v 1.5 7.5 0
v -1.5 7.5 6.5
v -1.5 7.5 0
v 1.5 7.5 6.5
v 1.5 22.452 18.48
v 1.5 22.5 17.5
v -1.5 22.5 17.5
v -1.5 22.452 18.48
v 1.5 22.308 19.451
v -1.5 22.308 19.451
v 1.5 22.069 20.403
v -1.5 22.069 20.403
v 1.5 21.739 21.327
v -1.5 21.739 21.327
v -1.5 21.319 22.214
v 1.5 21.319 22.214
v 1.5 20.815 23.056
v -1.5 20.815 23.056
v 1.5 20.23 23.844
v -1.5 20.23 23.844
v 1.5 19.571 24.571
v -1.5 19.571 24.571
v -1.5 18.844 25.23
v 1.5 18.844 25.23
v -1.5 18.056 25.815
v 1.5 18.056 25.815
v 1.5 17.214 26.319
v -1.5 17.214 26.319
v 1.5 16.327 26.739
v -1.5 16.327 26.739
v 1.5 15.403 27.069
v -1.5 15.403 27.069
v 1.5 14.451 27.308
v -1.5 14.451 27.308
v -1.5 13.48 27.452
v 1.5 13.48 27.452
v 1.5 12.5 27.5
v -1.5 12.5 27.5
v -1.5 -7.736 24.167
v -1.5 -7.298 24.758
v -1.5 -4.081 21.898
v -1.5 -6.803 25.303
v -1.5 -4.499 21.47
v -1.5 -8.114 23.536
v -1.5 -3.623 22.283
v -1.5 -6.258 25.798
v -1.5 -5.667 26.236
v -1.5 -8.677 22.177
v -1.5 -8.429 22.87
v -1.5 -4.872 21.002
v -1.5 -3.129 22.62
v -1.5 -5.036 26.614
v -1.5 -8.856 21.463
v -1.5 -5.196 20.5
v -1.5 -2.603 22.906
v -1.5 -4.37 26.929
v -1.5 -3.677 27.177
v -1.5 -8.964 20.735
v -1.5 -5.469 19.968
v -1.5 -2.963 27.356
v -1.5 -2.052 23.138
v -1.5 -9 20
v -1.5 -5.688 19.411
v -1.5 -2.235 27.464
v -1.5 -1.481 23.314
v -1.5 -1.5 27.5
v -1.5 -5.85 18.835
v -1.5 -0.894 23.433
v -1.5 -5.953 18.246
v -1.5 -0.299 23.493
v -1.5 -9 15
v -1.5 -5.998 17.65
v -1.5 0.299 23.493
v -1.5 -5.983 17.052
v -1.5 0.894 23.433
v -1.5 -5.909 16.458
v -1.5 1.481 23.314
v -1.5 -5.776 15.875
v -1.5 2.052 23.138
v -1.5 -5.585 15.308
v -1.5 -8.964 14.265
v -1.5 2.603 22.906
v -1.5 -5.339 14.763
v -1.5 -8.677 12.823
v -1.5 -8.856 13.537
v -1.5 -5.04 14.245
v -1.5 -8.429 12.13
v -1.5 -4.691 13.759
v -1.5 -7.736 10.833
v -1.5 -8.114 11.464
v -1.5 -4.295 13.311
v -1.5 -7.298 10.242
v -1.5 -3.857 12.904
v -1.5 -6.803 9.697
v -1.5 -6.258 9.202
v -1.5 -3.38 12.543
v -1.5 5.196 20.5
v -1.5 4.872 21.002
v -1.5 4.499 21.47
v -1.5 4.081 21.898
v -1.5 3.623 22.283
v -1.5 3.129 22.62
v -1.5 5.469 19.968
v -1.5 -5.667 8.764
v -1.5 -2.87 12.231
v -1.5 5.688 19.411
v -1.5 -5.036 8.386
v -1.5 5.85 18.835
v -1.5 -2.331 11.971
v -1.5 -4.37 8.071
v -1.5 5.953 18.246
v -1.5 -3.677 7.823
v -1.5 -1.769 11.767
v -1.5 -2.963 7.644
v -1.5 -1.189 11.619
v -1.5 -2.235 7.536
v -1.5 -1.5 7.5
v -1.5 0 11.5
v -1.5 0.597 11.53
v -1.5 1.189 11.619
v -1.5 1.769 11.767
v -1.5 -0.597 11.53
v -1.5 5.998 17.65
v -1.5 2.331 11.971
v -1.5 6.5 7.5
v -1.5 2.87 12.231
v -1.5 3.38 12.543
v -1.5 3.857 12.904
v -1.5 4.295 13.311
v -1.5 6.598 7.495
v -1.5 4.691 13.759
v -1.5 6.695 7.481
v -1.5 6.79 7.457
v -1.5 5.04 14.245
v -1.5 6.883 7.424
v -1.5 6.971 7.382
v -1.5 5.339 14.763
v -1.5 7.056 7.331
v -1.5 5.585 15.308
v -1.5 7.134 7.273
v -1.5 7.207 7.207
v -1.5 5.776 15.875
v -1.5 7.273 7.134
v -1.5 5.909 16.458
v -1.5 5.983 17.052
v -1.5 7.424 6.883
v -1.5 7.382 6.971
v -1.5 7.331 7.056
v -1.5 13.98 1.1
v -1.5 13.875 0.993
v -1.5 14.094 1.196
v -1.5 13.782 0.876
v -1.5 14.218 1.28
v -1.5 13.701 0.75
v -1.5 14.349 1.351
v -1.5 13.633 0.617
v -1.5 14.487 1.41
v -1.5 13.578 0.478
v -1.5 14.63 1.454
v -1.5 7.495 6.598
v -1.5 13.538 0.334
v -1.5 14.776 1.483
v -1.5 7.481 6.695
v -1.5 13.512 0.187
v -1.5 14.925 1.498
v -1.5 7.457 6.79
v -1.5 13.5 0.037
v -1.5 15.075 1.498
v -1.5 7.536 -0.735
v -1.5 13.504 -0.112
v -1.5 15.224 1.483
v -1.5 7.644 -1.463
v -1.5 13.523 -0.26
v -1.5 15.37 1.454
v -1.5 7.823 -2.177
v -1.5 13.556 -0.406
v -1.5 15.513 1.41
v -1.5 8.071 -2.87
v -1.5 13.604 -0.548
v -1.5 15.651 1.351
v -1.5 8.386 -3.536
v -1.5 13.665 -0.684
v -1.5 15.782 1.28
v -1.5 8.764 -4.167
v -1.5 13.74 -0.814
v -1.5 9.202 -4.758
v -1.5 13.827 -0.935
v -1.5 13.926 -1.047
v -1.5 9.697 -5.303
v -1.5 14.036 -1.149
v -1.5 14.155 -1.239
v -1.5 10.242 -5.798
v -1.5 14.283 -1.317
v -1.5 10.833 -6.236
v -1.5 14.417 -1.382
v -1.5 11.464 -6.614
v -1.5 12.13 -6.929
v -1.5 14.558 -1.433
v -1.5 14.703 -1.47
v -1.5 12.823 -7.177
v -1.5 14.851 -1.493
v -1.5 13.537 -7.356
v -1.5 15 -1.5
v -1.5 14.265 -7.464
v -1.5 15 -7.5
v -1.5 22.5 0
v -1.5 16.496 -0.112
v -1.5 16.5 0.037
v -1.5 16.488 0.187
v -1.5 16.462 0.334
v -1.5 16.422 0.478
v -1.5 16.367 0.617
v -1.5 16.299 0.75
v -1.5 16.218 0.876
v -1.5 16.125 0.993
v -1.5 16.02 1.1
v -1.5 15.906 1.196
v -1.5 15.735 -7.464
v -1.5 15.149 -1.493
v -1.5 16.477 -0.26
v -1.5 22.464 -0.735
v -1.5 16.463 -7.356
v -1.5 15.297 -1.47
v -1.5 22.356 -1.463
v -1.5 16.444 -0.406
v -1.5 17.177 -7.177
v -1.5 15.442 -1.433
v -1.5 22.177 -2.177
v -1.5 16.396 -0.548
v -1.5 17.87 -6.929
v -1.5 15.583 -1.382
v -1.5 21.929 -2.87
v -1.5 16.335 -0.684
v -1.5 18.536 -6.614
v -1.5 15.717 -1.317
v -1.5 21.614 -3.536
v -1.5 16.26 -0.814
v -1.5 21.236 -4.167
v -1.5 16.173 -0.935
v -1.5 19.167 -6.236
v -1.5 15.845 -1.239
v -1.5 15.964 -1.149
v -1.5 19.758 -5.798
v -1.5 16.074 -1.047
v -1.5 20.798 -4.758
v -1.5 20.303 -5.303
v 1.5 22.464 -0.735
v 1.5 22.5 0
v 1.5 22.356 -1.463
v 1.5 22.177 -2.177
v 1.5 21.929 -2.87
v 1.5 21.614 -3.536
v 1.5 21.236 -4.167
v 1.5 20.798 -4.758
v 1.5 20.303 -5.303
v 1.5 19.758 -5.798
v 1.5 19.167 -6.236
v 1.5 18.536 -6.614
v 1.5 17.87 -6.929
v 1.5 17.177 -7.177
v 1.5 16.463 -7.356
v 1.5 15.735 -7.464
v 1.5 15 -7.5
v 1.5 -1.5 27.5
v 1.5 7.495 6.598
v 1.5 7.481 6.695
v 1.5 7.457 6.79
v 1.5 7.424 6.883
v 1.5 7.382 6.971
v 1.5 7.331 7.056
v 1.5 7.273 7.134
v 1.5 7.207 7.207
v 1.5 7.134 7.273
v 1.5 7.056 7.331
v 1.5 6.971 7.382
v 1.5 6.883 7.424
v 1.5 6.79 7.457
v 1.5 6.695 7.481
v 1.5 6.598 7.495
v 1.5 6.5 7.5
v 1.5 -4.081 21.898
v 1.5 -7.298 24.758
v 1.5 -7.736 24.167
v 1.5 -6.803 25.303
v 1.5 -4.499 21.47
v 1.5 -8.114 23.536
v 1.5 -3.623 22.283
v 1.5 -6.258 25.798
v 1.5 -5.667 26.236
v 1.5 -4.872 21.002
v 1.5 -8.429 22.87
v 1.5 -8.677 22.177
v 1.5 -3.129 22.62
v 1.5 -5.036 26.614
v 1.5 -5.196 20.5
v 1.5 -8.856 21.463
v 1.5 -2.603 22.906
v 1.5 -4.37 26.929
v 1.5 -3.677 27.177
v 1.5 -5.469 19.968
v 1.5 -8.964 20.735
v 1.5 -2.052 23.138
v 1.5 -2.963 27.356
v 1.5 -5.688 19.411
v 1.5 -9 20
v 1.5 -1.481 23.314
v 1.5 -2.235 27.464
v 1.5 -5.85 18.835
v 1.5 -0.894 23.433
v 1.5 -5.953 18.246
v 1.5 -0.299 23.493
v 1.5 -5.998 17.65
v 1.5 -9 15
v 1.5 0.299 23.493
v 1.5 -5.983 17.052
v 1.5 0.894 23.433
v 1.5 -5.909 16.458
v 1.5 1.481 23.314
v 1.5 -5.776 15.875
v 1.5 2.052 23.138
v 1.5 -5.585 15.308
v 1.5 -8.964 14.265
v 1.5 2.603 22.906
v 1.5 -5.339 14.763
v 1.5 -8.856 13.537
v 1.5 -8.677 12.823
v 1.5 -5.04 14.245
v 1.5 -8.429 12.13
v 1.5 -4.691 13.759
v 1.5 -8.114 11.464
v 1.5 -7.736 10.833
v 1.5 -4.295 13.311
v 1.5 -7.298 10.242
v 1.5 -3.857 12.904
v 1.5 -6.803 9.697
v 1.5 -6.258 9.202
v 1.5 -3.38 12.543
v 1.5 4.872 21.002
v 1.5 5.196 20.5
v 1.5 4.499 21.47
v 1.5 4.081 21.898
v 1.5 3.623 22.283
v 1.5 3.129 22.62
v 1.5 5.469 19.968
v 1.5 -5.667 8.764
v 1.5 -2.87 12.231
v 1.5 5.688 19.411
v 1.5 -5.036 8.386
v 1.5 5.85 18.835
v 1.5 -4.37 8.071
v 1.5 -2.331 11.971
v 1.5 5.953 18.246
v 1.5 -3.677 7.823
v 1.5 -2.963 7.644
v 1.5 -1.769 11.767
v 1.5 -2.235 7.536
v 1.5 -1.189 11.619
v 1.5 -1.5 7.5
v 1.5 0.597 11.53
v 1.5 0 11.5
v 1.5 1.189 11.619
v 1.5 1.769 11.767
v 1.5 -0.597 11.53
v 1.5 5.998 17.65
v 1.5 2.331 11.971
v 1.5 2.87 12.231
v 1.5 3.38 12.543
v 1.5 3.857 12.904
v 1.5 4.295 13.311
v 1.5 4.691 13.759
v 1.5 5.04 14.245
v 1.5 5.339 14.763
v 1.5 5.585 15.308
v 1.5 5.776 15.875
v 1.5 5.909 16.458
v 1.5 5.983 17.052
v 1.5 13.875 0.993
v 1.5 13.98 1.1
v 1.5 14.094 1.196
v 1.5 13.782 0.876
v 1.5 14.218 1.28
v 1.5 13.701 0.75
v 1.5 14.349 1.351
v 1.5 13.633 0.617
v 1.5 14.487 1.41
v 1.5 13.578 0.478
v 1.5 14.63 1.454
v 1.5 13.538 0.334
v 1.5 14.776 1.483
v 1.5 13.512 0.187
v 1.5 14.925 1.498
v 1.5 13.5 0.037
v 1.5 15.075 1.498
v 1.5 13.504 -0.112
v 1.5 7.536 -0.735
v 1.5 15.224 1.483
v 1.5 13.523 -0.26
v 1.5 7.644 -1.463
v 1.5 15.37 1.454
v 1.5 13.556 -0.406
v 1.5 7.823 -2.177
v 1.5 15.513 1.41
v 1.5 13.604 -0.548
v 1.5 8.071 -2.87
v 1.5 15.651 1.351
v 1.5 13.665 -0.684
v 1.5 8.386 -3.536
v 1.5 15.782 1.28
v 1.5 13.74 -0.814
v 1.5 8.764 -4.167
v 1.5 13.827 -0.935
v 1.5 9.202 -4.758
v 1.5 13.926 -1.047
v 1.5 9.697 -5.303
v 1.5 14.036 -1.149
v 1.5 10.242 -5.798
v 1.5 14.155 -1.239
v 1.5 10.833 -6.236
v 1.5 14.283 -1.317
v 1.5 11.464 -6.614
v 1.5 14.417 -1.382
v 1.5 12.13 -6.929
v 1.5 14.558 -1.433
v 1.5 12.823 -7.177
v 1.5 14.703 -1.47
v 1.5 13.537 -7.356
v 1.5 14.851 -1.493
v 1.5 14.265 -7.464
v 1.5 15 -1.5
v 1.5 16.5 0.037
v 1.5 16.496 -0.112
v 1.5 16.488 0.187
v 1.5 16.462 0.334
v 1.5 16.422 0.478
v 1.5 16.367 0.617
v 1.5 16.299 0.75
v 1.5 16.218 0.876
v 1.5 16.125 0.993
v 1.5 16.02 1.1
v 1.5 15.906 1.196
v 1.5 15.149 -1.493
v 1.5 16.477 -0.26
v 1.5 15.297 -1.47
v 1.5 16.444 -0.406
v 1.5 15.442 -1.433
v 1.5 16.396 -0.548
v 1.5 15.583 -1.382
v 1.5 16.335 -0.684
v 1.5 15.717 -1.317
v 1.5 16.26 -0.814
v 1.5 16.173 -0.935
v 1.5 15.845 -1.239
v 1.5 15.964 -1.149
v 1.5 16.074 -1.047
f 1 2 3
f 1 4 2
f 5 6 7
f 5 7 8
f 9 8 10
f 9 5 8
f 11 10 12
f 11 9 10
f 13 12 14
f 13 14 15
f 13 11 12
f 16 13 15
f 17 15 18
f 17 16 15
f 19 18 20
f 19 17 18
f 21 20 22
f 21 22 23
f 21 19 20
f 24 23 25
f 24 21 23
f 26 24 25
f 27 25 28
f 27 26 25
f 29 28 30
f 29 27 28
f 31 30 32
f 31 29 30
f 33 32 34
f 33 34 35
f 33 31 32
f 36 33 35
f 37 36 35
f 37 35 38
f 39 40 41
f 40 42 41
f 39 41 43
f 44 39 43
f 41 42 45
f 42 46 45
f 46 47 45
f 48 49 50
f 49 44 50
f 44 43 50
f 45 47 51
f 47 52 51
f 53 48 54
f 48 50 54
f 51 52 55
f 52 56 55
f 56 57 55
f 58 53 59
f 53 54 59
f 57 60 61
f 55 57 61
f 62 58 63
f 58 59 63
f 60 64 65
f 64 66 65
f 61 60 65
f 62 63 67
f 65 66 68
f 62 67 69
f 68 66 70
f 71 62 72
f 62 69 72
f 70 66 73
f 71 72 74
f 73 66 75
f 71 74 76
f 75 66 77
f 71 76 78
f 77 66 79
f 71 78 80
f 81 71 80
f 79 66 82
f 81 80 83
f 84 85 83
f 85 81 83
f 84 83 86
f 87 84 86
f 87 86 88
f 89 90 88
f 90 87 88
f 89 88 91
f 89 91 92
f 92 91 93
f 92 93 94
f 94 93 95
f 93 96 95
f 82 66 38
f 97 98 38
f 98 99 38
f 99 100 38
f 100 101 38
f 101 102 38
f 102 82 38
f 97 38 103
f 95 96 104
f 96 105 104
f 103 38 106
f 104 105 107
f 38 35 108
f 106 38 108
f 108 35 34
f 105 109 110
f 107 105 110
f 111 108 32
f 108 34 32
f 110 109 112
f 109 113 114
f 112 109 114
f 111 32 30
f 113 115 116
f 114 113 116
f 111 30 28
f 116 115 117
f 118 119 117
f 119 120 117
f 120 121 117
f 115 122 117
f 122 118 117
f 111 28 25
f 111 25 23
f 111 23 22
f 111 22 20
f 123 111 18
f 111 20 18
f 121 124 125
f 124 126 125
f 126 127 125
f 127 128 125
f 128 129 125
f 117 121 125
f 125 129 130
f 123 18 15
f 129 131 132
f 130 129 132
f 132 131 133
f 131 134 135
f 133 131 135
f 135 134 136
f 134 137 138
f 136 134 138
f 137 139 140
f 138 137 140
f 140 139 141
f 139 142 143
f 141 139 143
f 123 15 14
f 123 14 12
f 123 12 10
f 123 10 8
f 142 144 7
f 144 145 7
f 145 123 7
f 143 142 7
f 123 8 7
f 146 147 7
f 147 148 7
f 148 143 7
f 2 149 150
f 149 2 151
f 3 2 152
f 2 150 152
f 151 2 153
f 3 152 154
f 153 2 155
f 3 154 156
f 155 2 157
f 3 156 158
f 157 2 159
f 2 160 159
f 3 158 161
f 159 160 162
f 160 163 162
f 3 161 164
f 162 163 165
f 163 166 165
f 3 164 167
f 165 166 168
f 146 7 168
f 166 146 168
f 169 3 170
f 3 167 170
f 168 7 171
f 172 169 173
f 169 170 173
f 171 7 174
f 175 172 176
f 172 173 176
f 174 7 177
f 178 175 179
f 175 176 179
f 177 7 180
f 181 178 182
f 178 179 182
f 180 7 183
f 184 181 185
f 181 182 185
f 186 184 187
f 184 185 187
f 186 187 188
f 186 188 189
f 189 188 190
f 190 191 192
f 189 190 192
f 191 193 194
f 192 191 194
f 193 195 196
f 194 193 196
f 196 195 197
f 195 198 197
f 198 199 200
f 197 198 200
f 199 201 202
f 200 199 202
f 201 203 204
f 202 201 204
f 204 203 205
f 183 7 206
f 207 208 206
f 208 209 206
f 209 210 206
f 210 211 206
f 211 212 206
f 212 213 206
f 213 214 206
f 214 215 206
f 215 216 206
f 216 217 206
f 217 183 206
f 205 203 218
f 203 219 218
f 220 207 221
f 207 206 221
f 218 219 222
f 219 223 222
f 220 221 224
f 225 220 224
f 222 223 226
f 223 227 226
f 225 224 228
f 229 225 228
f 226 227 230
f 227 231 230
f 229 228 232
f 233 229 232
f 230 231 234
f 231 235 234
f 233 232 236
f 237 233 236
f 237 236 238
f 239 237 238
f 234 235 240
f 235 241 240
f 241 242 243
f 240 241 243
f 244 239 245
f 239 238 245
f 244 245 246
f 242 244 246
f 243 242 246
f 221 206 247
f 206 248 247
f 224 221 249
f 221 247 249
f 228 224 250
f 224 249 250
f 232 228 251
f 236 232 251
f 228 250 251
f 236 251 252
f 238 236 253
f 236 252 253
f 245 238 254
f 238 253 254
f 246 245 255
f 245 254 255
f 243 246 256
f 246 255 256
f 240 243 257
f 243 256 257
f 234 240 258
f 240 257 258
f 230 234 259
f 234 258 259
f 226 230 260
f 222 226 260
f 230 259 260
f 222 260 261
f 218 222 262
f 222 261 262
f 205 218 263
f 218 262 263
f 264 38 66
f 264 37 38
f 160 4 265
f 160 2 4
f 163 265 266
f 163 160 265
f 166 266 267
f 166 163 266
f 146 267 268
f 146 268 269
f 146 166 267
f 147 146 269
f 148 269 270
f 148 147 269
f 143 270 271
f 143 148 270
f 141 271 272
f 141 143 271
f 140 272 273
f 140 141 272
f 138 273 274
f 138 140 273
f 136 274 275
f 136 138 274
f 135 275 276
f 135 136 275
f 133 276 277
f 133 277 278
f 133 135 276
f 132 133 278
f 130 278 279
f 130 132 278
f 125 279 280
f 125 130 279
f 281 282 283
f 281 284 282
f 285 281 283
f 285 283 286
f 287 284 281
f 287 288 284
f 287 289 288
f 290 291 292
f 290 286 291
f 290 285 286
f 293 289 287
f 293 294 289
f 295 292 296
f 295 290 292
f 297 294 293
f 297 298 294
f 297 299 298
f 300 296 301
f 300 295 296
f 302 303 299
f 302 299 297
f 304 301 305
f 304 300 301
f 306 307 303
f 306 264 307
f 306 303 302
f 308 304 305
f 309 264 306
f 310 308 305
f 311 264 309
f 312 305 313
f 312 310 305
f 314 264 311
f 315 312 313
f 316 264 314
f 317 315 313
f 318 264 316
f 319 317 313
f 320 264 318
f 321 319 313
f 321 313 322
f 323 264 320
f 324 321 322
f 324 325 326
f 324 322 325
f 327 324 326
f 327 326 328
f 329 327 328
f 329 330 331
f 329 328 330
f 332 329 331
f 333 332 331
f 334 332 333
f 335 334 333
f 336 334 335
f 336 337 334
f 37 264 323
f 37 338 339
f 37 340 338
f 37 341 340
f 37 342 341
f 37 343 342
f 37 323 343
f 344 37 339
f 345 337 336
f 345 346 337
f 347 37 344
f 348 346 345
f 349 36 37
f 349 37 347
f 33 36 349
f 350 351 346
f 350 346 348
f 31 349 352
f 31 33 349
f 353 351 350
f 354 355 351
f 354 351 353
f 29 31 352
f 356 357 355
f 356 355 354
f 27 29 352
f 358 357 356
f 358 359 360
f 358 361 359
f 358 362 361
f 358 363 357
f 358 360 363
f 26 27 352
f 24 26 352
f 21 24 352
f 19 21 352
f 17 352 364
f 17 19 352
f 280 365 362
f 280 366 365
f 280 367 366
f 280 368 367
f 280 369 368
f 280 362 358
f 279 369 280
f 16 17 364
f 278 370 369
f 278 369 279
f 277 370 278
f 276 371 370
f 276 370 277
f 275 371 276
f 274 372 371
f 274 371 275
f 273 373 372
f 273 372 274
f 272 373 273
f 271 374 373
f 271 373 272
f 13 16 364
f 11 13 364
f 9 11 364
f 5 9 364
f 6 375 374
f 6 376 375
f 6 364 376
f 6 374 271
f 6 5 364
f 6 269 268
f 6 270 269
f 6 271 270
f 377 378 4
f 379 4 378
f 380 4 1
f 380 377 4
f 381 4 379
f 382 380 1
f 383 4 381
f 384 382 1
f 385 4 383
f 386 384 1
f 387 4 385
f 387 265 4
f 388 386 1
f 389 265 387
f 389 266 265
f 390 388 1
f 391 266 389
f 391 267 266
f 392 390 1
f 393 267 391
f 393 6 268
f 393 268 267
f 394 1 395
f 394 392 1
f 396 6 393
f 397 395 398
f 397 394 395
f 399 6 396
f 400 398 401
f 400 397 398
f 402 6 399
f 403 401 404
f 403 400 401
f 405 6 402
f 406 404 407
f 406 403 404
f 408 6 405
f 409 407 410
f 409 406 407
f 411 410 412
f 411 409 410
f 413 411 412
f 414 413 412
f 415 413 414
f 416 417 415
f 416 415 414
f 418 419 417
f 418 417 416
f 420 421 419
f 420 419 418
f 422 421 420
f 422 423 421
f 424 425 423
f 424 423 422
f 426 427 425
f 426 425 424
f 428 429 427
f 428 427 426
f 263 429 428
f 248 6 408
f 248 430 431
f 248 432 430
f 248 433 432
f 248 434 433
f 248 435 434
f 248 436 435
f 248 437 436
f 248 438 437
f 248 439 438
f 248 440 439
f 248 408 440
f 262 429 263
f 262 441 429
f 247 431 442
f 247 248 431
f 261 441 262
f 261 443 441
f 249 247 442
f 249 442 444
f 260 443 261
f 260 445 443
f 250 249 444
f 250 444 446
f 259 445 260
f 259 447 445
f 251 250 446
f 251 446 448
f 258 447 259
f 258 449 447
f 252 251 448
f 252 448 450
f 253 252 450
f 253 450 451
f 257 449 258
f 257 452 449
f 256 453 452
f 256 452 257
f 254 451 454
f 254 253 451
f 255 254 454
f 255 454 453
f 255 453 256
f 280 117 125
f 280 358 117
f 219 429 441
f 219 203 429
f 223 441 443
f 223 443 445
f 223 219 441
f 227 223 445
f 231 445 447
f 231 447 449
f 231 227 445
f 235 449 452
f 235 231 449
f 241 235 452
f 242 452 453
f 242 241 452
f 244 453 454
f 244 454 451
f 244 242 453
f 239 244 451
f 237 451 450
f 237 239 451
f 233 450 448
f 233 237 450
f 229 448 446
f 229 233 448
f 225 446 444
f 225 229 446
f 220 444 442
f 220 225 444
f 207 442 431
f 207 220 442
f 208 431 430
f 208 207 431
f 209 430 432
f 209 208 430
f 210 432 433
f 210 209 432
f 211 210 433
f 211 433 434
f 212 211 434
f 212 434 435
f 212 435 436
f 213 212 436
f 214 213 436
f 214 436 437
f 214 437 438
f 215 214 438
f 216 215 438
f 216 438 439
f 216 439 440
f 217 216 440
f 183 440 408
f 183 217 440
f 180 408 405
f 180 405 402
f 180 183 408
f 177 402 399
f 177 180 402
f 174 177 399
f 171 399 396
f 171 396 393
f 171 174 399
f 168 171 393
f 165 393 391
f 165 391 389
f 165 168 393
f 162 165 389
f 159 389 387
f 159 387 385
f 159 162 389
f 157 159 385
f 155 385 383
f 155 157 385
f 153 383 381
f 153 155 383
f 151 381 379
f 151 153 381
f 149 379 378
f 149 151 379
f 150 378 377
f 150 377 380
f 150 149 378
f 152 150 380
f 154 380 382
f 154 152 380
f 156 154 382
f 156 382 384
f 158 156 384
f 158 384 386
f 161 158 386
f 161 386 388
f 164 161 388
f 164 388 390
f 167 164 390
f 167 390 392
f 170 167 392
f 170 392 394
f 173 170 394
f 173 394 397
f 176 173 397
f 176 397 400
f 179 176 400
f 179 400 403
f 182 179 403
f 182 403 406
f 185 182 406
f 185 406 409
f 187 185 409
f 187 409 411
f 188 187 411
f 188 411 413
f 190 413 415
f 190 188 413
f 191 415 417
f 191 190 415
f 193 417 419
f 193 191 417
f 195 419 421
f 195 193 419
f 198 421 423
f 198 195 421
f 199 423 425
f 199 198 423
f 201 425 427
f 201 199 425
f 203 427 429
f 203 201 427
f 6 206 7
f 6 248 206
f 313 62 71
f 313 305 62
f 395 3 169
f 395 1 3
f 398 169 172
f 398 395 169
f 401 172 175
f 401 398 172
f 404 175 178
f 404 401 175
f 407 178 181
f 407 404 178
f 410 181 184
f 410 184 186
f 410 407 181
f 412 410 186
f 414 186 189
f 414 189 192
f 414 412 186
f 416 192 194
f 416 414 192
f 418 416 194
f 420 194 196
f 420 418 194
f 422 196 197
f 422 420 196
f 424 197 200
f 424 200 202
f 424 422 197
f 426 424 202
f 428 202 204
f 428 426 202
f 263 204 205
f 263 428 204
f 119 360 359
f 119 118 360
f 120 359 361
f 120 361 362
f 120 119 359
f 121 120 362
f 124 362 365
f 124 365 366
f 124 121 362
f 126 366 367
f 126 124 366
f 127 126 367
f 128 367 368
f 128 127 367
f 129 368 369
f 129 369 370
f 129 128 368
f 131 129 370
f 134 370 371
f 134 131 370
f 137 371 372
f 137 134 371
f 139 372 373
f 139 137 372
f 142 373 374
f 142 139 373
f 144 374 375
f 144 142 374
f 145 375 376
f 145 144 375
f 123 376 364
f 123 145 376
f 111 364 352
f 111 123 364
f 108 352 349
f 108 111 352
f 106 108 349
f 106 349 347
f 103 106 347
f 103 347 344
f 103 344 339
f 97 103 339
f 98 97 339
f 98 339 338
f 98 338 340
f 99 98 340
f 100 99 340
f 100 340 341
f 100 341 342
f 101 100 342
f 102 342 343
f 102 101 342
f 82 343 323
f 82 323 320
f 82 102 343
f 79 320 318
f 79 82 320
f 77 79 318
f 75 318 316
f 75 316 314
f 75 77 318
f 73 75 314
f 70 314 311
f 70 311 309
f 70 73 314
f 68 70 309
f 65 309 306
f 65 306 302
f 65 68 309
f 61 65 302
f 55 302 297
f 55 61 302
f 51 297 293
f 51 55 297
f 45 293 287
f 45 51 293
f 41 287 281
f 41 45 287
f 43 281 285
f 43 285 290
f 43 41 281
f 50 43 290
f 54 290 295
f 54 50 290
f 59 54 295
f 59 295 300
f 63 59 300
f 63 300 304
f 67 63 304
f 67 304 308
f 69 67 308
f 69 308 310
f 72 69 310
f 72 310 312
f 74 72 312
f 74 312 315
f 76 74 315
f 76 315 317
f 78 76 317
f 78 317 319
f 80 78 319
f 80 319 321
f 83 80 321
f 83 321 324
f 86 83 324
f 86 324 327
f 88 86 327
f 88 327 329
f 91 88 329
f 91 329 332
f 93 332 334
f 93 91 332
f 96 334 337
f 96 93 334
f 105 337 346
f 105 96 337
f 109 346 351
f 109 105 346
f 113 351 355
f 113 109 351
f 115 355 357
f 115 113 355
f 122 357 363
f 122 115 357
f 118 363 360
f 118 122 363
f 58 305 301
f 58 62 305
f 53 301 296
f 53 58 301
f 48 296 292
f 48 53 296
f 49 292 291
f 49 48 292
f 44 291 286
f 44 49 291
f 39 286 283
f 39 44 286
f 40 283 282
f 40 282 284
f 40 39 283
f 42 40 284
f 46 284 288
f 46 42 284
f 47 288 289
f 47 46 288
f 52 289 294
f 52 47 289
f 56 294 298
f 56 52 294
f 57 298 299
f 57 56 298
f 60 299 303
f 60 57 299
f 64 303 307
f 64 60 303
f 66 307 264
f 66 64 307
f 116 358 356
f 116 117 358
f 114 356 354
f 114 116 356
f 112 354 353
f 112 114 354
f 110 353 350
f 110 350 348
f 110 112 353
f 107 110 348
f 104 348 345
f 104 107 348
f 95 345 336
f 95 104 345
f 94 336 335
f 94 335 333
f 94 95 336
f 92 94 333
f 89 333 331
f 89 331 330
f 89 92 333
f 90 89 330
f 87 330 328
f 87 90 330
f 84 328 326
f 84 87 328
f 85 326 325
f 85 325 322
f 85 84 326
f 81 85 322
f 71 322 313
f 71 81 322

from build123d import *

# Parameters (mm, degrees)
SKETCH1_R           = 6
SKETCH1_R_2         = 1.5
BOSS_EXTRUDE1_DEPTH = 1.5
FILLET1_R           = 7.5
FILLET2_R           = 1


with BuildPart() as part:
    # Sketch1 → Boss-Extrude1 (new, symmetric)
    with BuildSketch(Plane(origin=(0, 0, 0), x_dir=(0, 0, -1), z_dir=(1, 0, 0))):
        with BuildLine():
            Line((-7.5, 7.5), (7.5, 7.5))
            Line((7.5, 7.5), (7.5, 22.5))
            Line((7.5, 22.5), (-17.5, 22.5))
            ThreePointArc((-17.5, 22.5), (-24.571067812, 19.571067812), (-27.5, 12.5))
            Line((-27.5, 12.5), (-27.5, -9))
            Line((-27.5, -9), (-7.5, -9))
            Line((-7.5, -9), (-7.5, 7.5))
        make_face()
        with Locations((-17.5, 0)):
            Circle(SKETCH1_R, mode=Mode.SUBTRACT)
        with Locations((0, 15)):
            Circle(SKETCH1_R_2, mode=Mode.SUBTRACT)
    extrude(amount=BOSS_EXTRUDE1_DEPTH, both=True)

    # Fillet1
    fillet1_edges = [part.edges().sort_by_distance(p)[0] for p in [
        (0, -9, 27.5),
        (0, -9, 7.5),
        (0, 7.5, -7.5),
        (0, 22.5, -7.5),
    ]]
    fillet(fillet1_edges, radius=FILLET1_R - 0.0001)  # a hair under: the kernel refuses the full size

    # Fillet2
    fillet2_edges = [part.edges().sort_by_distance(p)[0] for p in [
        (0, 7.5, 7.5),
    ]]
    fillet(fillet2_edges, radius=FILLET2_R)


solid = part.part
